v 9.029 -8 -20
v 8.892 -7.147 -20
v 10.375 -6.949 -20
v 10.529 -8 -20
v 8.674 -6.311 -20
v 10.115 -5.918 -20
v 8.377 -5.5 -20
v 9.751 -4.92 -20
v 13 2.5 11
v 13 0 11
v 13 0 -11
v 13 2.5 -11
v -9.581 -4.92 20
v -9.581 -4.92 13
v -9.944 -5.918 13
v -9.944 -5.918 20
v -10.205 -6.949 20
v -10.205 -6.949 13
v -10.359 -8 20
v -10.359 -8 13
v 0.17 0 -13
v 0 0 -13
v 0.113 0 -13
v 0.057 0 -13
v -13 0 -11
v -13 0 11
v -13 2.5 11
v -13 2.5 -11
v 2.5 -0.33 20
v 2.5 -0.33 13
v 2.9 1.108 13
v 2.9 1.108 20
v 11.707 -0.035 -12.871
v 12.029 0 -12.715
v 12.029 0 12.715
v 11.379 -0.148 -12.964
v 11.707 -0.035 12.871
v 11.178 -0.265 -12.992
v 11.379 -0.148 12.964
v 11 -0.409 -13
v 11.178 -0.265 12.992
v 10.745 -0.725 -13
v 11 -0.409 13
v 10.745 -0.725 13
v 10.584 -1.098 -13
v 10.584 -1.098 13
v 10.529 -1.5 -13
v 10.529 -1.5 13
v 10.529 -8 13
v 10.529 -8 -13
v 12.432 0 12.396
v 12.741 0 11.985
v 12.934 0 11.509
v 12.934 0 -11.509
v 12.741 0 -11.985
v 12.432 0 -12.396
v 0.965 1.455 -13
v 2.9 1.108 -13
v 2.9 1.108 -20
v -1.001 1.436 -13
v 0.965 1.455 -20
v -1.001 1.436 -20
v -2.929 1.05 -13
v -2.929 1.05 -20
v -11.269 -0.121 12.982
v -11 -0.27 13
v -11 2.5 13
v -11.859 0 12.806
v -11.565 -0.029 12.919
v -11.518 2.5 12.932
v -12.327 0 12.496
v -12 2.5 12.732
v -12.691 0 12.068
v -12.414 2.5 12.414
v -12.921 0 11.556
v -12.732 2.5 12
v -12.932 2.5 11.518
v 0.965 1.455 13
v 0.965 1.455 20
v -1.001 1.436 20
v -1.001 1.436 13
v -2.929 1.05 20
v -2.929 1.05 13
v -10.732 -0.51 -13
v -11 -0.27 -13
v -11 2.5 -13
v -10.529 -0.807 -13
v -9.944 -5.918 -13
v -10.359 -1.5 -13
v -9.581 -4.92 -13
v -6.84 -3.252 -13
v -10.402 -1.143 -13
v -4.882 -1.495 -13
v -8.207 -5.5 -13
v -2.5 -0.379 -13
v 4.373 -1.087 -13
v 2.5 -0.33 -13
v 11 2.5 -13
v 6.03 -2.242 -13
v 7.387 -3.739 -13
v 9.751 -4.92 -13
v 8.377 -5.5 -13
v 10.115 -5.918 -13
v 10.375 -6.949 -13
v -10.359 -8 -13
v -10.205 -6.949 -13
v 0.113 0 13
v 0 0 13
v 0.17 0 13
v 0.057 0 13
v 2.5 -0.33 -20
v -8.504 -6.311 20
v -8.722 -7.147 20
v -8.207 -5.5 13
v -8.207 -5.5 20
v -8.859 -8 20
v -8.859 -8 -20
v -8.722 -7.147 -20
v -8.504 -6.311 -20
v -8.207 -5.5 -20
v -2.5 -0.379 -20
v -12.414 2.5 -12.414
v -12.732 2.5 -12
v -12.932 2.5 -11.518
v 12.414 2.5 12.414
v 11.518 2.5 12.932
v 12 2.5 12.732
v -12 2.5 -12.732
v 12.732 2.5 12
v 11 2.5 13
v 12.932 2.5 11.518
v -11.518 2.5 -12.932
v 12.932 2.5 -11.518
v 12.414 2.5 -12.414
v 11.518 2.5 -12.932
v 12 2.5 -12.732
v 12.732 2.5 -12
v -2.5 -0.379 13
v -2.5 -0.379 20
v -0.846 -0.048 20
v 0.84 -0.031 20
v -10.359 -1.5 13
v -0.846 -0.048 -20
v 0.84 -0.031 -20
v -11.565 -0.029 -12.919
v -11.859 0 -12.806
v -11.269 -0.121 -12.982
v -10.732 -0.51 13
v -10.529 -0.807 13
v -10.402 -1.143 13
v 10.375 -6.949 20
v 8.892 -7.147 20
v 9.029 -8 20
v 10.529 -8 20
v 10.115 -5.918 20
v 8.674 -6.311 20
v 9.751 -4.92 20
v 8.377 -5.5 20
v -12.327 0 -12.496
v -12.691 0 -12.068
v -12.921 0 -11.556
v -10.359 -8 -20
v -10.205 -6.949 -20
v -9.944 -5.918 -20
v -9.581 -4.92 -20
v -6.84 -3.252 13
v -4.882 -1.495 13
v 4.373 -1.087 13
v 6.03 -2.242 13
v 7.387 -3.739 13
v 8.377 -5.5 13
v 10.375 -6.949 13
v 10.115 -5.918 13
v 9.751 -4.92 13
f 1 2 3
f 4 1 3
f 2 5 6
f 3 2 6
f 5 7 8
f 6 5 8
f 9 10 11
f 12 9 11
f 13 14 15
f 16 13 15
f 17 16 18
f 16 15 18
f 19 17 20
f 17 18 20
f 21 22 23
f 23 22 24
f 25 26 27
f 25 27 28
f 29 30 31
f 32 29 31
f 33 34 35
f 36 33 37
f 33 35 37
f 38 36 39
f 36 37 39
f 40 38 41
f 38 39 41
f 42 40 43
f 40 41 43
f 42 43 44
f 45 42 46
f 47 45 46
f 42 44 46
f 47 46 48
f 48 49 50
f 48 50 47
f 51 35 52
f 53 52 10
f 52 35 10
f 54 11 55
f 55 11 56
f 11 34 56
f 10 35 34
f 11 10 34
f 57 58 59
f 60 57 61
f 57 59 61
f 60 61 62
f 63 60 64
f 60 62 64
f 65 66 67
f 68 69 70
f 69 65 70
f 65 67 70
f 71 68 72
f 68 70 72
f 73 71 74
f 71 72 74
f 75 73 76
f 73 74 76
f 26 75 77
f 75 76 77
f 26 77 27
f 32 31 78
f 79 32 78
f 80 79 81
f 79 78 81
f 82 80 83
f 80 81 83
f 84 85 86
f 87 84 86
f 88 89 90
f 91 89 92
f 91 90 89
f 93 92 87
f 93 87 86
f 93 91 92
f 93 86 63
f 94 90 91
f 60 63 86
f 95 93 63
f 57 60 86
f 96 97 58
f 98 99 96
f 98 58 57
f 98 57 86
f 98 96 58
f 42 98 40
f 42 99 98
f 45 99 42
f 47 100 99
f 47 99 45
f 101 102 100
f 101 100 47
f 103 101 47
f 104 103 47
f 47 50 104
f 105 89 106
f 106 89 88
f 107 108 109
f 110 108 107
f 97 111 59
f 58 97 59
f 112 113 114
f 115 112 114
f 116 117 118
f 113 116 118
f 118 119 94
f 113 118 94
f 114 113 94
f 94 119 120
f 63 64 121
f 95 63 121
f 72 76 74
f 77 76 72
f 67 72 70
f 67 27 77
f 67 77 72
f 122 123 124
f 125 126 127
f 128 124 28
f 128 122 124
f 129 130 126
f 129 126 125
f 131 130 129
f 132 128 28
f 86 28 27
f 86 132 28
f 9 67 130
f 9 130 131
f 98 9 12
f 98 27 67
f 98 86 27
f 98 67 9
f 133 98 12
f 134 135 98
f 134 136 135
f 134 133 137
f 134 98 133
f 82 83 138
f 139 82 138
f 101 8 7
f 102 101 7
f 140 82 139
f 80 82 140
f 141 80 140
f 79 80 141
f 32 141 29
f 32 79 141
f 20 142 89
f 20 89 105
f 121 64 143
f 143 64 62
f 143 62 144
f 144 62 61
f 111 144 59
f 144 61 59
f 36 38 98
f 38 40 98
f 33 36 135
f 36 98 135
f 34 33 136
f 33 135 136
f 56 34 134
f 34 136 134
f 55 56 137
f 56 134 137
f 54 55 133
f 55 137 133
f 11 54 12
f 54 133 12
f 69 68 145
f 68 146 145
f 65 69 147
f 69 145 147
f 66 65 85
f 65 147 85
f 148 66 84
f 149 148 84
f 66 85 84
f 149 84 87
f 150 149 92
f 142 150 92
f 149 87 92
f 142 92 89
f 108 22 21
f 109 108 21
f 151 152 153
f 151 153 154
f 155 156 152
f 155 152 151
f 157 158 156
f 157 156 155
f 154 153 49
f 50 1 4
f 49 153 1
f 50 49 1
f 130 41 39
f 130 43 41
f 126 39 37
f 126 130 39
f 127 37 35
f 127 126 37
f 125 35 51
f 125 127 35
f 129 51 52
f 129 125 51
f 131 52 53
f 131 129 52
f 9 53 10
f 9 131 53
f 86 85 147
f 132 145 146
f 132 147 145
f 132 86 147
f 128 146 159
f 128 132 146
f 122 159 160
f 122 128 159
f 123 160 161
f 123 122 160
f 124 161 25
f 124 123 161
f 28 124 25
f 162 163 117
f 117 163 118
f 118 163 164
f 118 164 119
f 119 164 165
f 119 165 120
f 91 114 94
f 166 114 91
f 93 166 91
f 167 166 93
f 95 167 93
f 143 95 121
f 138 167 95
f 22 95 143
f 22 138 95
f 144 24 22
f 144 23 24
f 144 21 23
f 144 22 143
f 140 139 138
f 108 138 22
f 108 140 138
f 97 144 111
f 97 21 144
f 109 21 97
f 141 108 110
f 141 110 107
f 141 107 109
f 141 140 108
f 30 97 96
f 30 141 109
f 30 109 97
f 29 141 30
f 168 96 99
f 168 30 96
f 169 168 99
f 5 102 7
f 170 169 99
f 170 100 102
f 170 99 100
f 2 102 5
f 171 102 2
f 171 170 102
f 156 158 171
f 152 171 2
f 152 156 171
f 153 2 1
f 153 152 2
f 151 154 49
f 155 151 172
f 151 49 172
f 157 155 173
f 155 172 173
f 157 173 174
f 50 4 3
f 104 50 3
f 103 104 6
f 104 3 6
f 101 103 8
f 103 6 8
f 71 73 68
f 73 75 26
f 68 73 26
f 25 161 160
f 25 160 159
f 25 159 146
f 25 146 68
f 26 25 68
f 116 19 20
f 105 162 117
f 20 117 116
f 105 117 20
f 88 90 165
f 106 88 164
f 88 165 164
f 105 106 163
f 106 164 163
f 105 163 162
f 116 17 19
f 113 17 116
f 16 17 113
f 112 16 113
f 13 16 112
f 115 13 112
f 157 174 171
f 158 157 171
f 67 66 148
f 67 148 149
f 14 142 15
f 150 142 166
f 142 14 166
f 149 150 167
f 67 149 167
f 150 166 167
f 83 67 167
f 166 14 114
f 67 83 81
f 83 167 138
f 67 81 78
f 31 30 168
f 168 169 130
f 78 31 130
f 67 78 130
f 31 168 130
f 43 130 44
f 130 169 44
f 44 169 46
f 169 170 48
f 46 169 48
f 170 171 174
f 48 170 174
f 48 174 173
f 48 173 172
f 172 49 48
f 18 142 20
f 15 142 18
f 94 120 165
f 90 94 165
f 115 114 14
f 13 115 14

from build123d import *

# Parameters (mm, degrees)
SKETCH1_W                       = 26
SKETCH1_H                       = 26
BOSS_EXTRUDE1_DEPTH             = 2.5
BOSS_EXTRUDE2_REACH             = 20.554
BOSS_EXTRUDE2_DIRECTION_2_REACH = 20.554
BOSS_EXTRUDE3_DEPTH             = 20
BOSS_EXTRUDE3_DEPTH_BACK        = 20
FILLET1_R                       = 2
FILLET2_R                       = 1.5


with BuildPart() as part:
    # Sketch1 → Boss-Extrude1 (new body)
    with BuildSketch(Plane(origin=(0, 0, 0), x_dir=(1, 0, 0), z_dir=(0, 1, 0))):
        Rectangle(SKETCH1_W, SKETCH1_H)
    extrude(amount=BOSS_EXTRUDE1_DEPTH)

    # Boss-Extrude2: up to this face of the body (flat: up to its plane)
    boss_extrude2_end = Plane(part.part.faces().sort_by_distance((0, 1.25, 13))[0])
    # Sketch2 → Boss-Extrude2 (add, up to the picked face)
    with BuildSketch(Plane.XY, mode=Mode.PRIVATE) as boss_extrude2_sk1:
        with BuildLine():
            Line((10.529394514, -8), (10.529394514, 0))
            Line((10.529394514, 0), (0.170155306, 0))
            ThreePointArc((0.170155306, 0), (6.116867713, -2.319963995), (9.029394514, -8))
            Line((9.029394514, -8), (10.529394514, -8))
        make_face()
    boss_extrude2_tool1 = split(extrude(boss_extrude2_sk1.sketch, amount=BOSS_EXTRUDE2_REACH, mode=Mode.PRIVATE), bisect_by=boss_extrude2_end, keep=Keep.BOTH, mode=Mode.PRIVATE)
    # Sketch2 → Boss-Extrude2 (add, up to the picked face)
    with BuildSketch(Plane.XY, mode=Mode.PRIVATE) as boss_extrude2_sk2:
        with BuildLine():
            ThreePointArc((-8.859239207, -8), (-5.946712406, -2.319963995), (0, 0))
            Line((0, 0), (-10.359239207, 0))
            Line((-10.359239207, 0), (-10.359239207, -8))
            Line((-10.359239207, -8), (-8.859239207, -8))
        make_face()
    boss_extrude2_tool2 = split(extrude(boss_extrude2_sk2.sketch, amount=BOSS_EXTRUDE2_REACH, mode=Mode.PRIVATE), bisect_by=boss_extrude2_end, keep=Keep.BOTH, mode=Mode.PRIVATE)
    add(boss_extrude2_tool1.solids().sort_by(Axis((8.165693, -2.801403, 0), (0, 0, 1)))[0])
    add(boss_extrude2_tool2.solids().sort_by(Axis((-7.995538, -2.801403, 0), (0, 0, 1)))[0])

    # Boss-Extrude2 direction 2: up to this face of the body (flat: up to its plane)
    boss_extrude2_direction_2_end = Plane(part.part.faces().sort_by_distance((0, 1.25, -13))[0])
    # Sketch2 → Boss-Extrude2 direction 2 (add, up to the picked face)
    with BuildSketch(Plane.XY, mode=Mode.PRIVATE) as boss_extrude2_direction_2_sk1:
        with BuildLine():
            Line((10.529394514, -8), (10.529394514, 0))
            Line((10.529394514, 0), (0.170155306, 0))
            ThreePointArc((0.170155306, 0), (6.116867713, -2.319963995), (9.029394514, -8))
            Line((9.029394514, -8), (10.529394514, -8))
        make_face()
    boss_extrude2_direction_2_tool1 = split(extrude(boss_extrude2_direction_2_sk1.sketch, amount=-BOSS_EXTRUDE2_DIRECTION_2_REACH, mode=Mode.PRIVATE), bisect_by=boss_extrude2_direction_2_end, keep=Keep.BOTH, mode=Mode.PRIVATE)
    # Sketch2 → Boss-Extrude2 direction 2 (add, up to the picked face)
    with BuildSketch(Plane.XY, mode=Mode.PRIVATE) as boss_extrude2_direction_2_sk2:
        with BuildLine():
            ThreePointArc((-8.859239207, -8), (-5.946712406, -2.319963995), (0, 0))
            Line((0, 0), (-10.359239207, 0))
            Line((-10.359239207, 0), (-10.359239207, -8))
            Line((-10.359239207, -8), (-8.859239207, -8))
        make_face()
    boss_extrude2_direction_2_tool2 = split(extrude(boss_extrude2_direction_2_sk2.sketch, amount=-BOSS_EXTRUDE2_DIRECTION_2_REACH, mode=Mode.PRIVATE), bisect_by=boss_extrude2_direction_2_end, keep=Keep.BOTH, mode=Mode.PRIVATE)
    add(boss_extrude2_direction_2_tool1.solids().sort_by(Axis((8.165693, -2.801403, 0), (0, 0, -1)))[0])
    add(boss_extrude2_direction_2_tool2.solids().sort_by(Axis((-7.995538, -2.801403, 0), (0, 0, -1)))[0])

    # Sketch3 → Boss-Extrude3 (add, two sides: drawn at the far end of the back side and taken through both)
    with BuildSketch(Plane.XY.offset(-BOSS_EXTRUDE3_DEPTH_BACK)):
        with BuildLine():
            ThreePointArc((-8.859239207, -8), (-8.623127821, -6.726459638), (-8.206654057, -5.5))
            Line((-8.206654057, -5.5), (-9.58127784, -4.919828013))
            ThreePointArc((-9.58127784, -4.919828013), (-10.087515452, -6.430298336), (-10.359239207, -8))
            Line((-10.359239207, -8), (-8.859239207, -8))
        make_face()
        with BuildLine():
            Line((9.751433146, -4.919828013), (8.376809364, -5.5))
            ThreePointArc((8.376809364, -5.5), (8.793283128, -6.726459638), (9.029394514, -8))
            Line((9.029394514, -8), (10.529394514, -8))
            ThreePointArc((10.529394514, -8), (10.257670759, -6.430298336), (9.751433146, -4.919828013))
        make_face()
        with BuildLine():
            ThreePointArc((-2.5, -0.378845376), (-0.003485724, -3.3627e-05), (2.5, -0.329641118))
            Line((2.5, -0.329641118), (2.900351797, 1.107685747))
            ThreePointArc((2.900351797, 1.107685747), (-0.01816798, 1.491936382), (-2.928560564, 1.050324284))
            Line((-2.928560564, 1.050324284), (-2.5, -0.378845376))
        make_face()
    extrude(amount=BOSS_EXTRUDE3_DEPTH + BOSS_EXTRUDE3_DEPTH_BACK)

    # Fillet1
    fillet1_edges = [part.edges().sort_by_distance(p)[0] for p in [
        (13, 1.25, 13),
        (-13, 1.25, 13),
        (-13, 1.25, -13),
        (13, 1.25, -13),
    ]]
    fillet(fillet1_edges, radius=FILLET1_R)

    # Fillet2
    fillet2_edges = [part.edges().sort_by_distance(p)[0] for p in [
        (-10.359239207, 0, 0),
        (10.529394514, 0, 0),
    ]]
    fillet(fillet2_edges, radius=FILLET2_R)


solid = part.part
